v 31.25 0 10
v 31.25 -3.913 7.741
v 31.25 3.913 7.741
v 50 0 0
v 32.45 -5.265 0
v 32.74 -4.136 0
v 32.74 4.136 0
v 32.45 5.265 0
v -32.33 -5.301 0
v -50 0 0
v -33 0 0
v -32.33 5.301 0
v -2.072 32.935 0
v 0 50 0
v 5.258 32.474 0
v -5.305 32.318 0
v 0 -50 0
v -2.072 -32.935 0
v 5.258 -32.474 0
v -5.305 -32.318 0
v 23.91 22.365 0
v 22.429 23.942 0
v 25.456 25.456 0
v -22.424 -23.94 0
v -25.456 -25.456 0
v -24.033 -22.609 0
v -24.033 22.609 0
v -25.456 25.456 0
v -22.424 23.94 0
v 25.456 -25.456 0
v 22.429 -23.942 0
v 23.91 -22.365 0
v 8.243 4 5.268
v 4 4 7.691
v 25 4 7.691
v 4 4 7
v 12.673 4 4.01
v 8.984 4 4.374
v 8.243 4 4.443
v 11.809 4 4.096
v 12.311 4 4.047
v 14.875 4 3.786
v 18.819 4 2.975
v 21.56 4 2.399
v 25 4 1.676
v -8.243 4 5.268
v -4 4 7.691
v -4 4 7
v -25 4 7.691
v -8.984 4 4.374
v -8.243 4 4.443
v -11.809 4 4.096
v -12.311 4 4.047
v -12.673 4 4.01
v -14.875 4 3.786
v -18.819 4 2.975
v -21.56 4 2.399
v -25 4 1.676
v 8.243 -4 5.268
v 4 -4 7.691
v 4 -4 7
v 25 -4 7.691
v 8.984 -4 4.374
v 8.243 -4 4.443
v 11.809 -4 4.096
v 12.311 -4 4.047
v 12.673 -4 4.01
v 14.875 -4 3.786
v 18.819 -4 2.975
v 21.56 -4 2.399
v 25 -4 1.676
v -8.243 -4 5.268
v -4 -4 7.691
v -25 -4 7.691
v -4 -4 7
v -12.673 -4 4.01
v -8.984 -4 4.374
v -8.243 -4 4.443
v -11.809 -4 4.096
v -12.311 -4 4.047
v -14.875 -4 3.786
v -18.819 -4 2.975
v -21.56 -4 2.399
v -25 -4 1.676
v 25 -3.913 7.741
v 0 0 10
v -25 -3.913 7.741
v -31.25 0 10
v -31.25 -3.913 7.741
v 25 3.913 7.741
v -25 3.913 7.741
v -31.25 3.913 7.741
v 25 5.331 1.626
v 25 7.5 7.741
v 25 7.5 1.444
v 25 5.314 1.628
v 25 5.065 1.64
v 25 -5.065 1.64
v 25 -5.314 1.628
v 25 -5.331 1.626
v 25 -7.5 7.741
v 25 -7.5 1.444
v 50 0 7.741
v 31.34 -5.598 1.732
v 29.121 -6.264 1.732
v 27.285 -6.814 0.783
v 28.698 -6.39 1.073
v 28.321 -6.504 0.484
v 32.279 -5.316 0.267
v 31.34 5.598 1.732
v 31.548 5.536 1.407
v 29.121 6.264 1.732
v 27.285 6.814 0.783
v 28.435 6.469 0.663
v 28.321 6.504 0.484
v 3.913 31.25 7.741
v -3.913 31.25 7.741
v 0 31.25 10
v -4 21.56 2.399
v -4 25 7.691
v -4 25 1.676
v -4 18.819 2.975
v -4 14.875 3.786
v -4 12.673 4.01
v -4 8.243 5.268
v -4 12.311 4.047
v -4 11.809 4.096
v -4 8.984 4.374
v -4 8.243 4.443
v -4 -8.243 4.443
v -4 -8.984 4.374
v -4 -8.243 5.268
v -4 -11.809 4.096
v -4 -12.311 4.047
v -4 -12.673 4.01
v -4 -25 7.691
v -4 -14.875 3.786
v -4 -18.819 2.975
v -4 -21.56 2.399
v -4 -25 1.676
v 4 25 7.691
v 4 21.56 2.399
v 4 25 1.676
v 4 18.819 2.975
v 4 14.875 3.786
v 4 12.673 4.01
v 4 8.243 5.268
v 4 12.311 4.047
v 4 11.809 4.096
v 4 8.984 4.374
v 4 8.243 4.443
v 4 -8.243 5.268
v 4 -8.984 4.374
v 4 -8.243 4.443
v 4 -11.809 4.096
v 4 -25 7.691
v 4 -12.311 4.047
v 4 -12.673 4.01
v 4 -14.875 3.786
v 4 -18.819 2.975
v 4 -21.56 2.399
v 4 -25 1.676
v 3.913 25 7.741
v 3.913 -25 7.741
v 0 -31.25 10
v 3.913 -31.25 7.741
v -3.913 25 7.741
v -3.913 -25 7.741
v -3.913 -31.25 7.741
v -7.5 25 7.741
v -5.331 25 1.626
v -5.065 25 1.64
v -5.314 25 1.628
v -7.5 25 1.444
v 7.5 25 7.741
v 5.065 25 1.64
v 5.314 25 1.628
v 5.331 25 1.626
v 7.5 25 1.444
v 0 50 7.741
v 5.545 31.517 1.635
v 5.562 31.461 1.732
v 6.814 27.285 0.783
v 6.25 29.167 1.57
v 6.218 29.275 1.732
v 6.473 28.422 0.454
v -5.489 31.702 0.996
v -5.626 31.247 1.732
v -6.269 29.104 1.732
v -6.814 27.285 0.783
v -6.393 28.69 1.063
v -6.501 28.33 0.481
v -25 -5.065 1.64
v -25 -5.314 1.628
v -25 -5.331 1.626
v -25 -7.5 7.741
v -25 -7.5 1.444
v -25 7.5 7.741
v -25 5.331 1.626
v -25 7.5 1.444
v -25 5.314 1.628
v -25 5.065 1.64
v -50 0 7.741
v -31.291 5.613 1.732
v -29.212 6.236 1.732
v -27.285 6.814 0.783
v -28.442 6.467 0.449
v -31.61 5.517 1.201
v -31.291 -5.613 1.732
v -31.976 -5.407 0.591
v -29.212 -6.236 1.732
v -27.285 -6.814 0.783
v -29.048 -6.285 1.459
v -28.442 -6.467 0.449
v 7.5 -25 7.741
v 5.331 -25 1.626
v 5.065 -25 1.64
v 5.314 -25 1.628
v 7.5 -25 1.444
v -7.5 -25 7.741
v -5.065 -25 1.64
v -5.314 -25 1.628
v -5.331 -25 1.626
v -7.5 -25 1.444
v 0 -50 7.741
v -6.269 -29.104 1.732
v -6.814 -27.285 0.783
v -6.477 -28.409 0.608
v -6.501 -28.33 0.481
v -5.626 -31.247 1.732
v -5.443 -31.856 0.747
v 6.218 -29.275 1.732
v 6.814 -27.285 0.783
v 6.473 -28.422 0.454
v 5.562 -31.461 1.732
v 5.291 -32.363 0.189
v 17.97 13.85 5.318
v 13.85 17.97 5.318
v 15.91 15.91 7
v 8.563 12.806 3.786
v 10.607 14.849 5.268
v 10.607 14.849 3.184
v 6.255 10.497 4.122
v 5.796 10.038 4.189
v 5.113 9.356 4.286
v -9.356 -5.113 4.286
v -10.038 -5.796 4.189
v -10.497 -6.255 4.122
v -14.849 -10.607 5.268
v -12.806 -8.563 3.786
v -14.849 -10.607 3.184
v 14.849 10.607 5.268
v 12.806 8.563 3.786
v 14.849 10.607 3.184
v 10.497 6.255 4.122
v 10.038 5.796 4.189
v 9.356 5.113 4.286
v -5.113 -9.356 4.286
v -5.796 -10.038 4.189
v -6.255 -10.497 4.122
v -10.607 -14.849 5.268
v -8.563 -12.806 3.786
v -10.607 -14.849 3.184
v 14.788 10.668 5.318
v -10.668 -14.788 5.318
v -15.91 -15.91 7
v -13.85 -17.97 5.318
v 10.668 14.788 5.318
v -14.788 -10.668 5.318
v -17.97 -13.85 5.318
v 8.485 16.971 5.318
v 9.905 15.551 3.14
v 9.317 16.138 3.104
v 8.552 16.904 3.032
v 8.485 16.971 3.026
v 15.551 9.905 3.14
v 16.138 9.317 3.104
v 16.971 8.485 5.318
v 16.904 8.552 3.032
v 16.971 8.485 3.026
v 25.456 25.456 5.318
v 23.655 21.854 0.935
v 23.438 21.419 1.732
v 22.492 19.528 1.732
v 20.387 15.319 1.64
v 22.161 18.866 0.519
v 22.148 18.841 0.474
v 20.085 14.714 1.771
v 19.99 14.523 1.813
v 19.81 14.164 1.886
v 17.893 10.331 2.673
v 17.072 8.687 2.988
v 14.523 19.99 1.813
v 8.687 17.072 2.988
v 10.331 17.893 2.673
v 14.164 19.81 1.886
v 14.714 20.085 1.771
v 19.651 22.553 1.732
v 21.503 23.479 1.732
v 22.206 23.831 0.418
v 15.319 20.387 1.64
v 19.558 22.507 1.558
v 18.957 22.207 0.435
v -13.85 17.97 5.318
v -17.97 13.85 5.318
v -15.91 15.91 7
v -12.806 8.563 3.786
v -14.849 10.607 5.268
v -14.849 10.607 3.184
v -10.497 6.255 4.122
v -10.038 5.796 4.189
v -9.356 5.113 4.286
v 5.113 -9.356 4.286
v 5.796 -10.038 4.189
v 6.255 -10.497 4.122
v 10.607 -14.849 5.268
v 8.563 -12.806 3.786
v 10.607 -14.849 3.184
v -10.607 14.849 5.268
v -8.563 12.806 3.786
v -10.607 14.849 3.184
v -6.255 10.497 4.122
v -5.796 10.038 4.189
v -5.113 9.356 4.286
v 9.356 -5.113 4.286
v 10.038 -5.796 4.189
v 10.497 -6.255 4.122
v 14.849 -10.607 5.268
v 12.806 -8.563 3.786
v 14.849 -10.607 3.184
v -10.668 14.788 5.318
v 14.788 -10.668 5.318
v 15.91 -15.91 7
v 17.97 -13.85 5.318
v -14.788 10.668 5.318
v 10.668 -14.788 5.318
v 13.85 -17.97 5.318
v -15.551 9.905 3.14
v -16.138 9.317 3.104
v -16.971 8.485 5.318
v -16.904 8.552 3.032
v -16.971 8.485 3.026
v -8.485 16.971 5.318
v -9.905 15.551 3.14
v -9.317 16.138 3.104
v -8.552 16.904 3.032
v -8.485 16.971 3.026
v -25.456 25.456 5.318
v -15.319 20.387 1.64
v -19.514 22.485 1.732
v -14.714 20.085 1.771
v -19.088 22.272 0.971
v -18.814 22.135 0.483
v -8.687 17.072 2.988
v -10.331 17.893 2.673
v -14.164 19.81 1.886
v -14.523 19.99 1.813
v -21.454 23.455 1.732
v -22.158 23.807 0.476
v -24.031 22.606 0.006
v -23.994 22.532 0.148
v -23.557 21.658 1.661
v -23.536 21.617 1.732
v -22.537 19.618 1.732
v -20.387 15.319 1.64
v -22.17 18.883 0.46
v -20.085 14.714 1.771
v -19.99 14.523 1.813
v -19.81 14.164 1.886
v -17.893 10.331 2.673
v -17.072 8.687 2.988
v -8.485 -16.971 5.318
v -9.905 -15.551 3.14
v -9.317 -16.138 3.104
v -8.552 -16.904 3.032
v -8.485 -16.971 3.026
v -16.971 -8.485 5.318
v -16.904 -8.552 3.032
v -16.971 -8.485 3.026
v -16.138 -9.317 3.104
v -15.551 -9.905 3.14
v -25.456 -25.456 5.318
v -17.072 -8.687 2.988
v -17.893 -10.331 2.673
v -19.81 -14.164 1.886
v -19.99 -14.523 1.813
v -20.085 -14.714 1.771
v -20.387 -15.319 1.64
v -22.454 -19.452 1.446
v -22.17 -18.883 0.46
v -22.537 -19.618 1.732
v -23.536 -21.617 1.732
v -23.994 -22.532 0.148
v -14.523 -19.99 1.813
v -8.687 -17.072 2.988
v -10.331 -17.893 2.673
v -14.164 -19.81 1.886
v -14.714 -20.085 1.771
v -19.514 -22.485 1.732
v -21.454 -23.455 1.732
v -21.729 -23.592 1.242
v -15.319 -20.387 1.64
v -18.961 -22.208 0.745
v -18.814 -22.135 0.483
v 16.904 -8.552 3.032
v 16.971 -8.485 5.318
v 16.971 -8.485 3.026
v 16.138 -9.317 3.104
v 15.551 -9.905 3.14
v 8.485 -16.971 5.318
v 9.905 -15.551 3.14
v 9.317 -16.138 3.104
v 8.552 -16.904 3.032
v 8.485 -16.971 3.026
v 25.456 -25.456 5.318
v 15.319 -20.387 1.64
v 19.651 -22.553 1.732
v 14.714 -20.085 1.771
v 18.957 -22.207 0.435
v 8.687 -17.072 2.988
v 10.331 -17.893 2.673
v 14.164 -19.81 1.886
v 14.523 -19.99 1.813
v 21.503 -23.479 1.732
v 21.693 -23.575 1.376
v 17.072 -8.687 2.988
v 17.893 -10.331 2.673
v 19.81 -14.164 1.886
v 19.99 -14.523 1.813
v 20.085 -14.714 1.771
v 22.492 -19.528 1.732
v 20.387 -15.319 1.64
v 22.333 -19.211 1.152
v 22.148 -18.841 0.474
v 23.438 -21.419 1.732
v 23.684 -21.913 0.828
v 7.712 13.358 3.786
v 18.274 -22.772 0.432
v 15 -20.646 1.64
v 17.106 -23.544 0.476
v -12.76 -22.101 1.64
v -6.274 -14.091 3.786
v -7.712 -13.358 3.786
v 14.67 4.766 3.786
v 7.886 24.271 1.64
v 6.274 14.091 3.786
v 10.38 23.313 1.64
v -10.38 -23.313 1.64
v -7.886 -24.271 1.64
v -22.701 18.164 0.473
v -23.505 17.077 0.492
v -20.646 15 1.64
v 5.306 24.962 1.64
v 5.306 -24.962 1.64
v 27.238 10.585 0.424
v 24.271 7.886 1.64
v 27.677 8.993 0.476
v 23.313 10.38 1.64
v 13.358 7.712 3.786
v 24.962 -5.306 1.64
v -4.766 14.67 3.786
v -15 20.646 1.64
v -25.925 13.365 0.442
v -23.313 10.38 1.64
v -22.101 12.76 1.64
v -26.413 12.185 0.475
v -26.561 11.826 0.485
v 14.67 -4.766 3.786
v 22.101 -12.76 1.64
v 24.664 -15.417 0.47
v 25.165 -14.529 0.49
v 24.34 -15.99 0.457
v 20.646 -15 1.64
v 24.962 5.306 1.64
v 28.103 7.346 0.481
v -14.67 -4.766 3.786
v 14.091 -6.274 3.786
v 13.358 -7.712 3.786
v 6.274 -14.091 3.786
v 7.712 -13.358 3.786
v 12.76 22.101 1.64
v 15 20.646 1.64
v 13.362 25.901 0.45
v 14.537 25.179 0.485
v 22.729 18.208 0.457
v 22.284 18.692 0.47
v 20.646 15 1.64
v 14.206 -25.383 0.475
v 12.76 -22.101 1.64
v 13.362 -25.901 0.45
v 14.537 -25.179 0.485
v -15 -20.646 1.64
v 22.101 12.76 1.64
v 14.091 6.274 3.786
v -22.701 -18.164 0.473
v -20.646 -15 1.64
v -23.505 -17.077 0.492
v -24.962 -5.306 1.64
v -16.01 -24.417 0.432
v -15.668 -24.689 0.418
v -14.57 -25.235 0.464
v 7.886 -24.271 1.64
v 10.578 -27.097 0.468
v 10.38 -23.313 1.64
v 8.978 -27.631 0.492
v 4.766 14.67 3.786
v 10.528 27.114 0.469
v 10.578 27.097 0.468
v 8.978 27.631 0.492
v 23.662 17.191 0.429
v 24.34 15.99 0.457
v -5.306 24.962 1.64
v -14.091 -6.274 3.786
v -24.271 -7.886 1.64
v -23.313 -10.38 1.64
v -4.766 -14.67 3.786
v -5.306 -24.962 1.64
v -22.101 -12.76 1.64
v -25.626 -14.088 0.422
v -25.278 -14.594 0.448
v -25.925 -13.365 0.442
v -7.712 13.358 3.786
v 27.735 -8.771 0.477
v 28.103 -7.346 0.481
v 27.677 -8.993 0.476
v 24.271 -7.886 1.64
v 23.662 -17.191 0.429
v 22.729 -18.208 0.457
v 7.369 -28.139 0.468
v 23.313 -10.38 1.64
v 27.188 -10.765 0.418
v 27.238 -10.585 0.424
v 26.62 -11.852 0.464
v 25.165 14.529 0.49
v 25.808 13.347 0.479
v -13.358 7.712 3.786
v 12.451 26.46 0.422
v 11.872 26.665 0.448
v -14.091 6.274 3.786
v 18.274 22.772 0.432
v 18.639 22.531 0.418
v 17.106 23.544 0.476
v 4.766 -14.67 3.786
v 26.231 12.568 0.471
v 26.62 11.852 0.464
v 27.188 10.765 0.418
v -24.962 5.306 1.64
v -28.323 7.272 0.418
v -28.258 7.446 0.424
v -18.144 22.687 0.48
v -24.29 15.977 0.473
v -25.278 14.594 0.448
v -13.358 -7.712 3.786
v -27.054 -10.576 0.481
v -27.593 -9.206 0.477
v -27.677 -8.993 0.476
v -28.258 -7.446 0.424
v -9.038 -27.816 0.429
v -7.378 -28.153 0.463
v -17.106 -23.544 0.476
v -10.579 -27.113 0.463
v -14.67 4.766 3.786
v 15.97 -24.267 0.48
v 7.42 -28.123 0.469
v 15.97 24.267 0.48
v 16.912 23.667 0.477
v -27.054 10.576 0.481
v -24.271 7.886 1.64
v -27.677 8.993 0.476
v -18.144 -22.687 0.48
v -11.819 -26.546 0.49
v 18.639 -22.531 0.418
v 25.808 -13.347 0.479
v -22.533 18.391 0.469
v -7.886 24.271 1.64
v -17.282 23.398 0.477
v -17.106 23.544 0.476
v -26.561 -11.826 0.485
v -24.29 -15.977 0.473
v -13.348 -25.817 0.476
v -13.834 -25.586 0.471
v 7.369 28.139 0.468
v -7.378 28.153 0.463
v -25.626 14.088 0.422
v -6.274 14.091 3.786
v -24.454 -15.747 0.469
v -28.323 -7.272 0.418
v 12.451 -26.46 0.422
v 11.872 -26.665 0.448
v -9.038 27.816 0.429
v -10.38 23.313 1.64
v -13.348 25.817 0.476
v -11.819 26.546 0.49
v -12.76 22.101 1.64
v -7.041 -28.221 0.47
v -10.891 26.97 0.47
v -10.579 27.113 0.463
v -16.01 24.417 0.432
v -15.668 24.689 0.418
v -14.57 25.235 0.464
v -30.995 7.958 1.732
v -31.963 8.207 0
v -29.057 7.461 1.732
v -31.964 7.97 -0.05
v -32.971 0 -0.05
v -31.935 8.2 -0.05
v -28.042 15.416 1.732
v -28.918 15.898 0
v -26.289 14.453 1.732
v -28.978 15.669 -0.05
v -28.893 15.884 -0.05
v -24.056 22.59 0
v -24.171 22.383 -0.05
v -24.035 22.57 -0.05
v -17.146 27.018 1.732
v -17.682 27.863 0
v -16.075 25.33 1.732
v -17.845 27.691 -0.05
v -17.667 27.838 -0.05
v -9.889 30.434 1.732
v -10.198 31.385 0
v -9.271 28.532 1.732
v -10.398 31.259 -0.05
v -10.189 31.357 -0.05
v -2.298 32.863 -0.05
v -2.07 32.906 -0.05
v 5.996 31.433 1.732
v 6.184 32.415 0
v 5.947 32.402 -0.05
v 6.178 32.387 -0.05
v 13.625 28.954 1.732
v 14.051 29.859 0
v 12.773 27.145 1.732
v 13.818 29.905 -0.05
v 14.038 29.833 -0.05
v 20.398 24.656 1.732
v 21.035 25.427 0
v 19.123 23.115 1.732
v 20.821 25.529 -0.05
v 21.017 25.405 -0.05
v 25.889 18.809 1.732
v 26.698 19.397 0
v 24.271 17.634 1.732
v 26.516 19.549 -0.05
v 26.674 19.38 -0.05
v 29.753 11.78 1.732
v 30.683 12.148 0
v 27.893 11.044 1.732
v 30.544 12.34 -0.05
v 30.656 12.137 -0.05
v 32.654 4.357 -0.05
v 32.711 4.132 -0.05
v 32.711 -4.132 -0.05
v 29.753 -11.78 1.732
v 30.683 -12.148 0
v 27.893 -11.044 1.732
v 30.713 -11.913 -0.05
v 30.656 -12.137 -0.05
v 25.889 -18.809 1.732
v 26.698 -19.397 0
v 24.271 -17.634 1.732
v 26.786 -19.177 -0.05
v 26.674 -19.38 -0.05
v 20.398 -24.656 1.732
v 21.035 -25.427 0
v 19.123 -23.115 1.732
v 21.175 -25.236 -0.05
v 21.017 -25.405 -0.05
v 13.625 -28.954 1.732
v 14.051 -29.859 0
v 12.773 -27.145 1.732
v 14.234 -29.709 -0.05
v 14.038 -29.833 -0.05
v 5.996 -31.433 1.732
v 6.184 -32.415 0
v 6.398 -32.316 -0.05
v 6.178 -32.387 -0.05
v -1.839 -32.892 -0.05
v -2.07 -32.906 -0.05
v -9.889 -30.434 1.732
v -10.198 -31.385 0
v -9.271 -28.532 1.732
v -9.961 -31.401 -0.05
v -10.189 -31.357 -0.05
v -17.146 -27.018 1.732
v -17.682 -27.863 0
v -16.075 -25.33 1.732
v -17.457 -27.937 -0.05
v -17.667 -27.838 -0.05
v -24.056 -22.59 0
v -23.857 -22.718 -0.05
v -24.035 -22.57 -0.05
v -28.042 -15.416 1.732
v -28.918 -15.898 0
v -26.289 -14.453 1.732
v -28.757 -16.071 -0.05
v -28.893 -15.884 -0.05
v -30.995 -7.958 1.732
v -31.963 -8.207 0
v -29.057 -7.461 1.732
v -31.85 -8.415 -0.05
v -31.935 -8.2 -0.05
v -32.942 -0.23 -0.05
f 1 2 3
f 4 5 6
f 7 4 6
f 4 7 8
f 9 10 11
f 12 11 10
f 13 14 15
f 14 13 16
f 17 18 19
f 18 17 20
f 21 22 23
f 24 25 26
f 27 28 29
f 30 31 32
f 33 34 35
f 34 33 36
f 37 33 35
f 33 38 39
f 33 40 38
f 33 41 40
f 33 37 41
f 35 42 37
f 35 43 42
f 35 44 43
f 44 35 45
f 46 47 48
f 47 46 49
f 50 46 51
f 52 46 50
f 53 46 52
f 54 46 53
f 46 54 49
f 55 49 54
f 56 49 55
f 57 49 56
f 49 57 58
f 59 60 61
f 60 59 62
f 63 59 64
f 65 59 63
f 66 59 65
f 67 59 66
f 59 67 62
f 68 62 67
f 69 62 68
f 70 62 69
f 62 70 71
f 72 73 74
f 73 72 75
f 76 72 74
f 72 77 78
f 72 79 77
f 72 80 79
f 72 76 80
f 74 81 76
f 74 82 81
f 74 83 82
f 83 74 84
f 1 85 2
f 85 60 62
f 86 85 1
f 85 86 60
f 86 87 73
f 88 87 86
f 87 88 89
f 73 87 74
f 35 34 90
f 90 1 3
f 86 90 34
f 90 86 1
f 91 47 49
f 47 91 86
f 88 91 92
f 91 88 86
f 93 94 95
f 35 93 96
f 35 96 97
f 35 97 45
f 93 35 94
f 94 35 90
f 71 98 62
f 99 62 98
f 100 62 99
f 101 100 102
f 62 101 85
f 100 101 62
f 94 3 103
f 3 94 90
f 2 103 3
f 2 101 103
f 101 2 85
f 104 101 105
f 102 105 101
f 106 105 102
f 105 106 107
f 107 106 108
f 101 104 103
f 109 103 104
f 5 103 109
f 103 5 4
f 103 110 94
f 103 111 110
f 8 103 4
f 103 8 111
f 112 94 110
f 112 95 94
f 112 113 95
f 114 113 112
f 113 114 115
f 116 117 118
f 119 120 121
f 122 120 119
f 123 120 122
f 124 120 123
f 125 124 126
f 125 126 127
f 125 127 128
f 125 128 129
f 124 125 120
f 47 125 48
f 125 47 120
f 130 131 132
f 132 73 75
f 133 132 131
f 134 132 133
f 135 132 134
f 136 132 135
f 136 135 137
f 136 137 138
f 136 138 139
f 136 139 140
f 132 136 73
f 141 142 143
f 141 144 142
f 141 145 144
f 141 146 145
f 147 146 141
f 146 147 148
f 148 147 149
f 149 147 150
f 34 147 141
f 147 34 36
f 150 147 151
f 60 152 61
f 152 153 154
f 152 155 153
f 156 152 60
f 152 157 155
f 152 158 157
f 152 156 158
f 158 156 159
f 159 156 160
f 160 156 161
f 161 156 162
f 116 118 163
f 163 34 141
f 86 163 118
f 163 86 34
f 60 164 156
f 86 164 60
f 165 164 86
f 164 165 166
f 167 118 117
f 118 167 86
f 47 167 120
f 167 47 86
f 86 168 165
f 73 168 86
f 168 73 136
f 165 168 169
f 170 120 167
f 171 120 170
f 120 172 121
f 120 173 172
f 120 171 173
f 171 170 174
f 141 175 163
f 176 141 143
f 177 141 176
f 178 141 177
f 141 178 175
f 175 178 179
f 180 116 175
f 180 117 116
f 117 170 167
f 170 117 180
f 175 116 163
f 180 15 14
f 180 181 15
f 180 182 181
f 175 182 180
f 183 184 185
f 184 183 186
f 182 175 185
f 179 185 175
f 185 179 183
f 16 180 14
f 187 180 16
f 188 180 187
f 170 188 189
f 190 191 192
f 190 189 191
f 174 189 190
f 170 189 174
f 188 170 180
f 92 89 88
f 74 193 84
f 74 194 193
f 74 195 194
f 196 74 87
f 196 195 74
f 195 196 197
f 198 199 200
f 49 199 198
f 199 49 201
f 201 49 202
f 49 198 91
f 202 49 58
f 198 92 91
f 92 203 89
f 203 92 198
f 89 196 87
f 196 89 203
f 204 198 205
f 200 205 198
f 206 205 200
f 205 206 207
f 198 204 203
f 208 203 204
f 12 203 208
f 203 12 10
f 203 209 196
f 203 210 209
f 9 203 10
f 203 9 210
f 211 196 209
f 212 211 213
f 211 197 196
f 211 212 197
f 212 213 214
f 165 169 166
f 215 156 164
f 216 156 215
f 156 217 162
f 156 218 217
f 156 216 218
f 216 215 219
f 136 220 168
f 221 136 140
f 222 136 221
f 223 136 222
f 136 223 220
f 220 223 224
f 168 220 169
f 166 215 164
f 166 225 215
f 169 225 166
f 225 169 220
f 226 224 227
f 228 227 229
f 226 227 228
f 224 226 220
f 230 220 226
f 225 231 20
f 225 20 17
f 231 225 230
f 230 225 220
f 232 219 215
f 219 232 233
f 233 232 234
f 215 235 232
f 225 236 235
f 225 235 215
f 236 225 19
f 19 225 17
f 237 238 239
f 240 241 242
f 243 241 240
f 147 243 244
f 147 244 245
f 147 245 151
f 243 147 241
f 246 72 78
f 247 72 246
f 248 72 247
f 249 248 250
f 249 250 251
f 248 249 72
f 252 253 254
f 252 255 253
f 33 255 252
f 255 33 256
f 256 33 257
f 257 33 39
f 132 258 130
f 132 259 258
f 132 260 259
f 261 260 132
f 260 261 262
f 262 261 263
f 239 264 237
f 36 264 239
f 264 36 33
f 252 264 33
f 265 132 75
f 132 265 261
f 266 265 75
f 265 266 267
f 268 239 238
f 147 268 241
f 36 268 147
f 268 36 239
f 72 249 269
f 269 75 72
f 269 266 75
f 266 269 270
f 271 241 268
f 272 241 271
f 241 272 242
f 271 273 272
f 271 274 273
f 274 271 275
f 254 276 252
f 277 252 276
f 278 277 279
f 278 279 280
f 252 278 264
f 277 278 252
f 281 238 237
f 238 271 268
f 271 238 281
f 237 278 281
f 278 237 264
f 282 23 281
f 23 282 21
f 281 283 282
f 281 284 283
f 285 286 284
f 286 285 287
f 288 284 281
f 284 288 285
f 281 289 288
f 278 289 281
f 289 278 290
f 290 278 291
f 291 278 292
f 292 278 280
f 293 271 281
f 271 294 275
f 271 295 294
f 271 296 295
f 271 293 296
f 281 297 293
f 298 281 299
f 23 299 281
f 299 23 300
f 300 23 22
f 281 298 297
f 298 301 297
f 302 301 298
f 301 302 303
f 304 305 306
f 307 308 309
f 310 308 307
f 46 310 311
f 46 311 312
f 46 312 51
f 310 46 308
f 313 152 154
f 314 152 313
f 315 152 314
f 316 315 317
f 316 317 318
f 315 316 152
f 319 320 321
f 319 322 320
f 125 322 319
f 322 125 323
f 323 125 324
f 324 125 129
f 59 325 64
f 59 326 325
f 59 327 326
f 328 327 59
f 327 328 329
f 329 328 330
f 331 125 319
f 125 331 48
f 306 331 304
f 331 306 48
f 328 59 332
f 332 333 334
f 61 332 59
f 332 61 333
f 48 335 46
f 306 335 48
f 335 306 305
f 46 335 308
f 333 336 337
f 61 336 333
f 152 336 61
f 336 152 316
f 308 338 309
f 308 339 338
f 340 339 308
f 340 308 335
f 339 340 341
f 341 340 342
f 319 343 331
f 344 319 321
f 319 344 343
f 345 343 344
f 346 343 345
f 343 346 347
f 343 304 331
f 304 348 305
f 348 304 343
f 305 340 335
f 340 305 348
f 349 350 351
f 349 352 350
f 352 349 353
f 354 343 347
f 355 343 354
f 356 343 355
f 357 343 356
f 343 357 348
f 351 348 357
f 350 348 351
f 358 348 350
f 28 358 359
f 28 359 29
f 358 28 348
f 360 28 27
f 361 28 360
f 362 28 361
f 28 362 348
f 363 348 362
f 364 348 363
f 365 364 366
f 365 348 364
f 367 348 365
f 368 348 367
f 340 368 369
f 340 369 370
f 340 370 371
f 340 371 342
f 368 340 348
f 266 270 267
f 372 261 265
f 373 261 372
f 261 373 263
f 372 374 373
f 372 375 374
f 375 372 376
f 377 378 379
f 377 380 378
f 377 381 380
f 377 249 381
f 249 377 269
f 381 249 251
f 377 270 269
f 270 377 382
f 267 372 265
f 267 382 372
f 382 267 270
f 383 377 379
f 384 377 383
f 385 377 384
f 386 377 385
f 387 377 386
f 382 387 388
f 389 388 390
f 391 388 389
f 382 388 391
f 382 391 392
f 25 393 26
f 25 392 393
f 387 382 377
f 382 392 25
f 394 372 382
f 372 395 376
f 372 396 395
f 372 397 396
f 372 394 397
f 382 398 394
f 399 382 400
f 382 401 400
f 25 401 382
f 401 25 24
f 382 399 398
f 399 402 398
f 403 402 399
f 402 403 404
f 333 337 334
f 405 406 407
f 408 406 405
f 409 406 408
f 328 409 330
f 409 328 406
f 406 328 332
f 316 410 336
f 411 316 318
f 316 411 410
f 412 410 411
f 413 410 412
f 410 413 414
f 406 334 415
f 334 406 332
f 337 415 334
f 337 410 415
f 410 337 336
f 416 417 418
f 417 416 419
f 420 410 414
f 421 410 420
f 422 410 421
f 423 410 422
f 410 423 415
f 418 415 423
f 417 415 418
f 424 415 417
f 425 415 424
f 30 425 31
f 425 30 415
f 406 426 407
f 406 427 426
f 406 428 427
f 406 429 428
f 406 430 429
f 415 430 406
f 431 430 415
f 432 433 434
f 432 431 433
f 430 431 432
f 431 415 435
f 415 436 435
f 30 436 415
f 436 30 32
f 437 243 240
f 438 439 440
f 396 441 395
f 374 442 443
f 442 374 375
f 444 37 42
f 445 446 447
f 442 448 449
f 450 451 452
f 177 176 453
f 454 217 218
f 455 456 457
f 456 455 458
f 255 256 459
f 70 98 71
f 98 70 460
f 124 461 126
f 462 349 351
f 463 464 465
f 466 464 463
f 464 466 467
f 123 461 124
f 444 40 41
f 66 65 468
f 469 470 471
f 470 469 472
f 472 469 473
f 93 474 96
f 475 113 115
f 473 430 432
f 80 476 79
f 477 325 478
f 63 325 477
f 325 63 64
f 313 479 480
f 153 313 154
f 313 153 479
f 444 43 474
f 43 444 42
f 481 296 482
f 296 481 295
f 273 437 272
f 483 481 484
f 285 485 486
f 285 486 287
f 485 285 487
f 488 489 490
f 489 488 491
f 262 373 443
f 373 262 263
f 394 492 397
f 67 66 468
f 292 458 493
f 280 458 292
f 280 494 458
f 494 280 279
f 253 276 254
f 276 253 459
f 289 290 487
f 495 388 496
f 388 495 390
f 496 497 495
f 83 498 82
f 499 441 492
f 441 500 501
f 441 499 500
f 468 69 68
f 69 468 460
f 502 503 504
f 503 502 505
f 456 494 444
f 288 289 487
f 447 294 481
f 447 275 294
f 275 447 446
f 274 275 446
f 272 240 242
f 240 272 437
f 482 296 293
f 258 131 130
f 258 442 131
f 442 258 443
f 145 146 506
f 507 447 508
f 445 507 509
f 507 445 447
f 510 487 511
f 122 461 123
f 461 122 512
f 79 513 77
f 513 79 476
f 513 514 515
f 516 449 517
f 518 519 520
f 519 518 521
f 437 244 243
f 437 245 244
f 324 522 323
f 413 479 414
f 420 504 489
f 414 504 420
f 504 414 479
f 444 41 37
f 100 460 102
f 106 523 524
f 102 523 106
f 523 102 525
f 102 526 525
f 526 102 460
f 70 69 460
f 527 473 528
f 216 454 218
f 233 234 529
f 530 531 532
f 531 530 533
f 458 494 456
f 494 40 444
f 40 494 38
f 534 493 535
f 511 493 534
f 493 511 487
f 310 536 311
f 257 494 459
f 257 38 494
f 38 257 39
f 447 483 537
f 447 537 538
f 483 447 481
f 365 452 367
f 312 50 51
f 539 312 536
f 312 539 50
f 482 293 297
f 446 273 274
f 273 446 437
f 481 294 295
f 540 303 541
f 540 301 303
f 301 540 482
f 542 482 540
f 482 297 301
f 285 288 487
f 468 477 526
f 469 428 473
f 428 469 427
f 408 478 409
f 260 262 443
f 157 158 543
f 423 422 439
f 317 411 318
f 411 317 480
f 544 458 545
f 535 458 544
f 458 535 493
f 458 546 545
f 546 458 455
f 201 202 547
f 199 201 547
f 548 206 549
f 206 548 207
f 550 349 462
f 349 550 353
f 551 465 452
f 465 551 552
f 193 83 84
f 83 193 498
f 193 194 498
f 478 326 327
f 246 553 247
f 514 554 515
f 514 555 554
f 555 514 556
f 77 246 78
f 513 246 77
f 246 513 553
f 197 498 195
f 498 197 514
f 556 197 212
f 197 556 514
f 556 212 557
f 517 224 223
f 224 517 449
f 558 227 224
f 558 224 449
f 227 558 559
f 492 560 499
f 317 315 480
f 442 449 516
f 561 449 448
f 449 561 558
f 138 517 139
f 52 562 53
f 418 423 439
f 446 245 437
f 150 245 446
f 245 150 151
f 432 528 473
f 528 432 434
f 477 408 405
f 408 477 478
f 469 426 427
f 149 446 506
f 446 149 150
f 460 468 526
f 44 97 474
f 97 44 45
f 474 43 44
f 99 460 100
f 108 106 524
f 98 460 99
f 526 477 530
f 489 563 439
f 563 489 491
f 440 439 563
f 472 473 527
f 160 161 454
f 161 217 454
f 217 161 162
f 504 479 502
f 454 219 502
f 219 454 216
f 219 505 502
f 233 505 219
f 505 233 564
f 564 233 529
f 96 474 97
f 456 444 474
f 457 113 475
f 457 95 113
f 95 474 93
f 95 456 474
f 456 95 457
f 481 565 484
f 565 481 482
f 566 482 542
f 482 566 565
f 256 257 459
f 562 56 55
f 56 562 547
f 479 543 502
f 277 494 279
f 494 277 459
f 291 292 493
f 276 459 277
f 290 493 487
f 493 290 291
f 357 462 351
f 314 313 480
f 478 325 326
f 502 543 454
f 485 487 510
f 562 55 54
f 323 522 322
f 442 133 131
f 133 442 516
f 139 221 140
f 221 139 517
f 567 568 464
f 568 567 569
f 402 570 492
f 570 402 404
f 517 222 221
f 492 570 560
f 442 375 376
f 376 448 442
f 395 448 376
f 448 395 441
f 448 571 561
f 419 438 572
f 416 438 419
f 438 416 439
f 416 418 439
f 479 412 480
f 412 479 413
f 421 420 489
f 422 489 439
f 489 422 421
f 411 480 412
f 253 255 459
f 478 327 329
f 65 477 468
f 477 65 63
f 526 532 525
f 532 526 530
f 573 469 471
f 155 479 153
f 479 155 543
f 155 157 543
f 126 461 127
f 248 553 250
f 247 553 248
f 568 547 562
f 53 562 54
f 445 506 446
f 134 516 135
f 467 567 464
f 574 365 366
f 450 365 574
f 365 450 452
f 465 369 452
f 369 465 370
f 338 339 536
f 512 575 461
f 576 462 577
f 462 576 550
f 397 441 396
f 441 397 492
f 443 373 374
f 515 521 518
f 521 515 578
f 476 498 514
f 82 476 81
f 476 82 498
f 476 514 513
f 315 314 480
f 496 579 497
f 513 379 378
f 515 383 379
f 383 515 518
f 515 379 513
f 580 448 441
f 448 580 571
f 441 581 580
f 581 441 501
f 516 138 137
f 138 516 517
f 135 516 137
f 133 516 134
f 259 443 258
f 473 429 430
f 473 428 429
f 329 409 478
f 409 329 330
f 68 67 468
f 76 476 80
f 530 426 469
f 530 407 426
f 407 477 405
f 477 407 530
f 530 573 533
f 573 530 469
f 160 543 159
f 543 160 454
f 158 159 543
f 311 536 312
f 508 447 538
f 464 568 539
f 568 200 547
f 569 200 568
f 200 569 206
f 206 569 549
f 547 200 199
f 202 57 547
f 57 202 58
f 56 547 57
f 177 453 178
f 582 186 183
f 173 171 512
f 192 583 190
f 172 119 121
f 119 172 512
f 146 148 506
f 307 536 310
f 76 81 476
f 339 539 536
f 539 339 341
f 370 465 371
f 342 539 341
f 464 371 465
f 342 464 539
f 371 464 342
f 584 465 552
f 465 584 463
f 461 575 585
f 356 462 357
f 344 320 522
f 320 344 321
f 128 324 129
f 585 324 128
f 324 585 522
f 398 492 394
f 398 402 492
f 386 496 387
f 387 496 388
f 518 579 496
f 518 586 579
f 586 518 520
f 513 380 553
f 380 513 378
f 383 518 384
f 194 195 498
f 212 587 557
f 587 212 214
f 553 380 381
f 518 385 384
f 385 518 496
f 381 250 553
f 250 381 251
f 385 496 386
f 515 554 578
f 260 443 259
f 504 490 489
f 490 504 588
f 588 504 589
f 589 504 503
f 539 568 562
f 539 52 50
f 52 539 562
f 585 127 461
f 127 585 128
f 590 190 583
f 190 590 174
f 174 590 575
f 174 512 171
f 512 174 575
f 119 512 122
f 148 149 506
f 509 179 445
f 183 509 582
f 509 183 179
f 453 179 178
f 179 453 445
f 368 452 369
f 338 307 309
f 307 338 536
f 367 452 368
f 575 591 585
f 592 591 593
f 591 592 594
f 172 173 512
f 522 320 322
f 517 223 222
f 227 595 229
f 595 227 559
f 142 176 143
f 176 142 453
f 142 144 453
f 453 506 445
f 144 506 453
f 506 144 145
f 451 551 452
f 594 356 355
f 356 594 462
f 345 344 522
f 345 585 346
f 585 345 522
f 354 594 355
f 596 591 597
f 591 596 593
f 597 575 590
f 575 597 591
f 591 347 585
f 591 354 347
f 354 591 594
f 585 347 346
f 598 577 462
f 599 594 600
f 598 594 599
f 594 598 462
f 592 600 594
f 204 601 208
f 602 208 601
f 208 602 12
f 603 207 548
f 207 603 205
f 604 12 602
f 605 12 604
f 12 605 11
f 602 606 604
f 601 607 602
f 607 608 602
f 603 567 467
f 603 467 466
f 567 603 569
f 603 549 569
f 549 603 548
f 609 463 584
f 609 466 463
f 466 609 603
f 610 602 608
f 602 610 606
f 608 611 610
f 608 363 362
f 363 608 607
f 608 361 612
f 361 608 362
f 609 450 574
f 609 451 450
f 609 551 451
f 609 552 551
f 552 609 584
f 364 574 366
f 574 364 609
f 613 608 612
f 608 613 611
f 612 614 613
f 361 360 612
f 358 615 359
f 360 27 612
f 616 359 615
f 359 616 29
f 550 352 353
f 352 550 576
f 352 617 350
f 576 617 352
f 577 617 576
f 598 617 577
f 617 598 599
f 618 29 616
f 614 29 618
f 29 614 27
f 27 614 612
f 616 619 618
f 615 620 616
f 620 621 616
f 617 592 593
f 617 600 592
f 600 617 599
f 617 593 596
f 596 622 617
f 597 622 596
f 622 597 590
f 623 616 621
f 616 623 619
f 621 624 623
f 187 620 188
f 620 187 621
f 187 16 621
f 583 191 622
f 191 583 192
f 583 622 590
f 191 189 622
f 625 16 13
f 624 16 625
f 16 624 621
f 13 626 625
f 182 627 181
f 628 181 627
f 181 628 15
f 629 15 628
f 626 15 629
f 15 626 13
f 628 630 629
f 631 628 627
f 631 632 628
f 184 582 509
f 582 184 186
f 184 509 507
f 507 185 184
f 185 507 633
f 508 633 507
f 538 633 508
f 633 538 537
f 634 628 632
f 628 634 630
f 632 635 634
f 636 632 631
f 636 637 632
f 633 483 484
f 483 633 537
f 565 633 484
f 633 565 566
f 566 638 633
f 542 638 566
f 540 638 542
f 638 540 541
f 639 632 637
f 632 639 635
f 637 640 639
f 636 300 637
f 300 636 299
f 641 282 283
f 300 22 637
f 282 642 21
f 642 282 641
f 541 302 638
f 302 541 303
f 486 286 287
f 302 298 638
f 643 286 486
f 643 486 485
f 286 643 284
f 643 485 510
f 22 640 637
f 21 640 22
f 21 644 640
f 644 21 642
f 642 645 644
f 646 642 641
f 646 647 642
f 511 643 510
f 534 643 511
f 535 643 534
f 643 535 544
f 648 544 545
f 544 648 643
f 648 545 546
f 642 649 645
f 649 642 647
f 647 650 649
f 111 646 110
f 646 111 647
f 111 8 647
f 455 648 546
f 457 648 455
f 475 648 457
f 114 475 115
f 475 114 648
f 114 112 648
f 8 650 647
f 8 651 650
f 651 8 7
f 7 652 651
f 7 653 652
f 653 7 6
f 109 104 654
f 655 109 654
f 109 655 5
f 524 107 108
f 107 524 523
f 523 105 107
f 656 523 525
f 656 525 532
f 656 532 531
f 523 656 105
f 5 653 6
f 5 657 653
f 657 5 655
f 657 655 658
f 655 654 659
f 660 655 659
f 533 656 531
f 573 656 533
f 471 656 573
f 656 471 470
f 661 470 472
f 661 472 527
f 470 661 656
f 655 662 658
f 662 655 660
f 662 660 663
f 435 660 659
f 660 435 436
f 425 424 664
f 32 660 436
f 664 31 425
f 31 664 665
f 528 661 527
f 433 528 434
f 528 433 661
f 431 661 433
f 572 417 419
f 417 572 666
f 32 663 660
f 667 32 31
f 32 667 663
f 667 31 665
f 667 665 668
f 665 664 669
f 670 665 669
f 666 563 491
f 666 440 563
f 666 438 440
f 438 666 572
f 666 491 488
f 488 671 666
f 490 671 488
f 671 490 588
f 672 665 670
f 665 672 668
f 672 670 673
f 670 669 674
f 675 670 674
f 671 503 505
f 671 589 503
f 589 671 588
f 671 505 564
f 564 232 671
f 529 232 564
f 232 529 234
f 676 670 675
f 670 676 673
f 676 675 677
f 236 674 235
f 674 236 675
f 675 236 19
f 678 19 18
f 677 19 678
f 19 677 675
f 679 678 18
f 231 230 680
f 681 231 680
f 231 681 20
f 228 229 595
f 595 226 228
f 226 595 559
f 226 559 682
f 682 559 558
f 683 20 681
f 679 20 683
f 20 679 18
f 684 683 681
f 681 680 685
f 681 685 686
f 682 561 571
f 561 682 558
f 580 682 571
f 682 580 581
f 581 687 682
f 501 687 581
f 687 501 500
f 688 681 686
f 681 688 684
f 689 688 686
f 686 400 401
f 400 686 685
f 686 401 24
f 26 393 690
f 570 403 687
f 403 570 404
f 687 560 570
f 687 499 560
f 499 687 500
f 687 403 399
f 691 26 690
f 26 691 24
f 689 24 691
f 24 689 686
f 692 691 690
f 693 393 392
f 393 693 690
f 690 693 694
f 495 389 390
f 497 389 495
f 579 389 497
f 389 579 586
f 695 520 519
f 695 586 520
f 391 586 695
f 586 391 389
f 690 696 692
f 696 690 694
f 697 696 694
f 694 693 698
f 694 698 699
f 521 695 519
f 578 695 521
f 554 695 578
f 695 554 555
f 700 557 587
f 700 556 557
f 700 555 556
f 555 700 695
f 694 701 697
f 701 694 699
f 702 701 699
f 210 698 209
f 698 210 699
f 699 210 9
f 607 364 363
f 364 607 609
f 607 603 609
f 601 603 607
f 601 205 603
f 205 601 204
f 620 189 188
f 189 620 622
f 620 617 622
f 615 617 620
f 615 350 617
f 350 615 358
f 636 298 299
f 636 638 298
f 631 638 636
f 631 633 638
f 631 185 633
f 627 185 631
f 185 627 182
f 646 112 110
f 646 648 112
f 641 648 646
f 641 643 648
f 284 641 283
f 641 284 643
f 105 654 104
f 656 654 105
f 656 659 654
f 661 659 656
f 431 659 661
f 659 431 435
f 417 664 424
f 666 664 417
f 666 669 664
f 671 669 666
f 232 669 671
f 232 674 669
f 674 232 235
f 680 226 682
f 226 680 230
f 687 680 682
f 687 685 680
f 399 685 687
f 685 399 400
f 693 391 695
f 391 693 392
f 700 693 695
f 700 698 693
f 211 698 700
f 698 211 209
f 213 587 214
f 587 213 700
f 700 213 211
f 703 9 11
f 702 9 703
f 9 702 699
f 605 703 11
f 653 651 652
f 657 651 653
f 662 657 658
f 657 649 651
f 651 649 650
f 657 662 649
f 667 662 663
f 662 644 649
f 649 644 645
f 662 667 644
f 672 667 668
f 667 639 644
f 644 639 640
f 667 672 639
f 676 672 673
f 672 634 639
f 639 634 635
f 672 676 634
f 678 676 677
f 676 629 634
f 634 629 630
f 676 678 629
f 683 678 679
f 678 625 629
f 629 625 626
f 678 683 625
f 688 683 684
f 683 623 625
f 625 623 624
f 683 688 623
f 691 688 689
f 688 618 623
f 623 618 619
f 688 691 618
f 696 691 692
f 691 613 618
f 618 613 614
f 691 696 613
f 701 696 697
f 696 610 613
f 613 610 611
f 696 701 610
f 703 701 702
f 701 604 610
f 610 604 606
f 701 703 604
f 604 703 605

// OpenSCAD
circleRadius = 31;
circleHeight = 5;
torusRadius = 2;
arrowLength = 50;
arrowWidth = 8;
arrowHeadLength = 25;
arrowHeadWidth = 15;
arrowHeight = 10;
smallArrowLength = 36;
smallArrowWidth = 6;
smallArrowHeadLength = 18;
smallArrowHeadWidth = 12;
smallArrowHeight = 7;
arrowAngle = 30;
arrowCentreProportion = 1/4;
arrowHeadHeightProportion = 1.1;
fiddle = 0.05;
accuracy = 0.2;

sphereRadius = (circleRadius * circleRadius + circleHeight * circleHeight) / (2 * circleHeight);

module arrowHead(length, width, baseHeight, height) {
  linear_extrude(height = baseHeight+fiddle) {
    polygon([[length, 0], [0, -width/2], [0, width/2]]);
  }
  polyhedron(
    points = [[length, 0, baseHeight], [0, -width/2, baseHeight], [0, width/2, baseHeight], [length * arrowCentreProportion, 0, height]],
    faces = [[0, 1, 3], [1, 2, 3], [2, 0, 3]]
  );
};

module arrow(length, shaftWidth, headLength, headWidth, height) {
  difference() {
	translate([-fiddle, -shaftWidth/2, 0]) {
      cube([fiddle+length - headLength * (1 - arrowCentreProportion), shaftWidth, height], center=false);
	}
	translate([-fiddle*2, 0, height]) {
	rotate([arrowAngle, 0, 0]) {
	translate([0, -shaftWidth, 0]) {
      cube([length - headLength/2+fiddle*3, shaftWidth*2, height], center=false);
    }
    }
    }
	translate([-fiddle*2, 0, height]) {
	rotate([-arrowAngle, 0, 0]) {
	translate([0, -shaftWidth, 0]) {
      cube([length - headLength/2+ fiddle*3, shaftWidth*2, height], center=false);
    }
    }
    }
  }
  translate([length - headLength, 0, 0]) {
    arrowHead(headLength, headWidth, height - tan(arrowAngle) * shaftWidth / 2, height*arrowHeadHeightProportion);
  }
};
//cube([arrowLength - arrowHeadLength/2, arrowBodyWidthFactor*arrowHeadWidth, arrowHeight]);
for(i = [0:3]) {
  rotate([0, 0, i*90]) {
    arrow(arrowLength, arrowWidth, arrowHeadLength, arrowHeadWidth, arrowHeight);
  }
}
rotate(45) {
for(i = [0:3]) {
  rotate([0, 0, i*90]) {
    arrow(smallArrowLength, smallArrowWidth, smallArrowHeadLength, smallArrowHeadWidth, smallArrowHeight);
  }
}
}


intersection() {
  translate([0, 0, 100/2-fiddle]) {
    cube([200, 200, 100], center=true);
  } 
  union() {
    translate([0, 0, -(sphereRadius-circleHeight)]) {
      sphere(r=sphereRadius, $fn = 300*accuracy);
    }
    rotate_extrude(convexity = 10, $fn=128*accuracy) {
    translate([circleRadius, 0, 0]) {
      circle(r = torusRadius, $fn=30*accuracy); 
    }
    }
  }
}
